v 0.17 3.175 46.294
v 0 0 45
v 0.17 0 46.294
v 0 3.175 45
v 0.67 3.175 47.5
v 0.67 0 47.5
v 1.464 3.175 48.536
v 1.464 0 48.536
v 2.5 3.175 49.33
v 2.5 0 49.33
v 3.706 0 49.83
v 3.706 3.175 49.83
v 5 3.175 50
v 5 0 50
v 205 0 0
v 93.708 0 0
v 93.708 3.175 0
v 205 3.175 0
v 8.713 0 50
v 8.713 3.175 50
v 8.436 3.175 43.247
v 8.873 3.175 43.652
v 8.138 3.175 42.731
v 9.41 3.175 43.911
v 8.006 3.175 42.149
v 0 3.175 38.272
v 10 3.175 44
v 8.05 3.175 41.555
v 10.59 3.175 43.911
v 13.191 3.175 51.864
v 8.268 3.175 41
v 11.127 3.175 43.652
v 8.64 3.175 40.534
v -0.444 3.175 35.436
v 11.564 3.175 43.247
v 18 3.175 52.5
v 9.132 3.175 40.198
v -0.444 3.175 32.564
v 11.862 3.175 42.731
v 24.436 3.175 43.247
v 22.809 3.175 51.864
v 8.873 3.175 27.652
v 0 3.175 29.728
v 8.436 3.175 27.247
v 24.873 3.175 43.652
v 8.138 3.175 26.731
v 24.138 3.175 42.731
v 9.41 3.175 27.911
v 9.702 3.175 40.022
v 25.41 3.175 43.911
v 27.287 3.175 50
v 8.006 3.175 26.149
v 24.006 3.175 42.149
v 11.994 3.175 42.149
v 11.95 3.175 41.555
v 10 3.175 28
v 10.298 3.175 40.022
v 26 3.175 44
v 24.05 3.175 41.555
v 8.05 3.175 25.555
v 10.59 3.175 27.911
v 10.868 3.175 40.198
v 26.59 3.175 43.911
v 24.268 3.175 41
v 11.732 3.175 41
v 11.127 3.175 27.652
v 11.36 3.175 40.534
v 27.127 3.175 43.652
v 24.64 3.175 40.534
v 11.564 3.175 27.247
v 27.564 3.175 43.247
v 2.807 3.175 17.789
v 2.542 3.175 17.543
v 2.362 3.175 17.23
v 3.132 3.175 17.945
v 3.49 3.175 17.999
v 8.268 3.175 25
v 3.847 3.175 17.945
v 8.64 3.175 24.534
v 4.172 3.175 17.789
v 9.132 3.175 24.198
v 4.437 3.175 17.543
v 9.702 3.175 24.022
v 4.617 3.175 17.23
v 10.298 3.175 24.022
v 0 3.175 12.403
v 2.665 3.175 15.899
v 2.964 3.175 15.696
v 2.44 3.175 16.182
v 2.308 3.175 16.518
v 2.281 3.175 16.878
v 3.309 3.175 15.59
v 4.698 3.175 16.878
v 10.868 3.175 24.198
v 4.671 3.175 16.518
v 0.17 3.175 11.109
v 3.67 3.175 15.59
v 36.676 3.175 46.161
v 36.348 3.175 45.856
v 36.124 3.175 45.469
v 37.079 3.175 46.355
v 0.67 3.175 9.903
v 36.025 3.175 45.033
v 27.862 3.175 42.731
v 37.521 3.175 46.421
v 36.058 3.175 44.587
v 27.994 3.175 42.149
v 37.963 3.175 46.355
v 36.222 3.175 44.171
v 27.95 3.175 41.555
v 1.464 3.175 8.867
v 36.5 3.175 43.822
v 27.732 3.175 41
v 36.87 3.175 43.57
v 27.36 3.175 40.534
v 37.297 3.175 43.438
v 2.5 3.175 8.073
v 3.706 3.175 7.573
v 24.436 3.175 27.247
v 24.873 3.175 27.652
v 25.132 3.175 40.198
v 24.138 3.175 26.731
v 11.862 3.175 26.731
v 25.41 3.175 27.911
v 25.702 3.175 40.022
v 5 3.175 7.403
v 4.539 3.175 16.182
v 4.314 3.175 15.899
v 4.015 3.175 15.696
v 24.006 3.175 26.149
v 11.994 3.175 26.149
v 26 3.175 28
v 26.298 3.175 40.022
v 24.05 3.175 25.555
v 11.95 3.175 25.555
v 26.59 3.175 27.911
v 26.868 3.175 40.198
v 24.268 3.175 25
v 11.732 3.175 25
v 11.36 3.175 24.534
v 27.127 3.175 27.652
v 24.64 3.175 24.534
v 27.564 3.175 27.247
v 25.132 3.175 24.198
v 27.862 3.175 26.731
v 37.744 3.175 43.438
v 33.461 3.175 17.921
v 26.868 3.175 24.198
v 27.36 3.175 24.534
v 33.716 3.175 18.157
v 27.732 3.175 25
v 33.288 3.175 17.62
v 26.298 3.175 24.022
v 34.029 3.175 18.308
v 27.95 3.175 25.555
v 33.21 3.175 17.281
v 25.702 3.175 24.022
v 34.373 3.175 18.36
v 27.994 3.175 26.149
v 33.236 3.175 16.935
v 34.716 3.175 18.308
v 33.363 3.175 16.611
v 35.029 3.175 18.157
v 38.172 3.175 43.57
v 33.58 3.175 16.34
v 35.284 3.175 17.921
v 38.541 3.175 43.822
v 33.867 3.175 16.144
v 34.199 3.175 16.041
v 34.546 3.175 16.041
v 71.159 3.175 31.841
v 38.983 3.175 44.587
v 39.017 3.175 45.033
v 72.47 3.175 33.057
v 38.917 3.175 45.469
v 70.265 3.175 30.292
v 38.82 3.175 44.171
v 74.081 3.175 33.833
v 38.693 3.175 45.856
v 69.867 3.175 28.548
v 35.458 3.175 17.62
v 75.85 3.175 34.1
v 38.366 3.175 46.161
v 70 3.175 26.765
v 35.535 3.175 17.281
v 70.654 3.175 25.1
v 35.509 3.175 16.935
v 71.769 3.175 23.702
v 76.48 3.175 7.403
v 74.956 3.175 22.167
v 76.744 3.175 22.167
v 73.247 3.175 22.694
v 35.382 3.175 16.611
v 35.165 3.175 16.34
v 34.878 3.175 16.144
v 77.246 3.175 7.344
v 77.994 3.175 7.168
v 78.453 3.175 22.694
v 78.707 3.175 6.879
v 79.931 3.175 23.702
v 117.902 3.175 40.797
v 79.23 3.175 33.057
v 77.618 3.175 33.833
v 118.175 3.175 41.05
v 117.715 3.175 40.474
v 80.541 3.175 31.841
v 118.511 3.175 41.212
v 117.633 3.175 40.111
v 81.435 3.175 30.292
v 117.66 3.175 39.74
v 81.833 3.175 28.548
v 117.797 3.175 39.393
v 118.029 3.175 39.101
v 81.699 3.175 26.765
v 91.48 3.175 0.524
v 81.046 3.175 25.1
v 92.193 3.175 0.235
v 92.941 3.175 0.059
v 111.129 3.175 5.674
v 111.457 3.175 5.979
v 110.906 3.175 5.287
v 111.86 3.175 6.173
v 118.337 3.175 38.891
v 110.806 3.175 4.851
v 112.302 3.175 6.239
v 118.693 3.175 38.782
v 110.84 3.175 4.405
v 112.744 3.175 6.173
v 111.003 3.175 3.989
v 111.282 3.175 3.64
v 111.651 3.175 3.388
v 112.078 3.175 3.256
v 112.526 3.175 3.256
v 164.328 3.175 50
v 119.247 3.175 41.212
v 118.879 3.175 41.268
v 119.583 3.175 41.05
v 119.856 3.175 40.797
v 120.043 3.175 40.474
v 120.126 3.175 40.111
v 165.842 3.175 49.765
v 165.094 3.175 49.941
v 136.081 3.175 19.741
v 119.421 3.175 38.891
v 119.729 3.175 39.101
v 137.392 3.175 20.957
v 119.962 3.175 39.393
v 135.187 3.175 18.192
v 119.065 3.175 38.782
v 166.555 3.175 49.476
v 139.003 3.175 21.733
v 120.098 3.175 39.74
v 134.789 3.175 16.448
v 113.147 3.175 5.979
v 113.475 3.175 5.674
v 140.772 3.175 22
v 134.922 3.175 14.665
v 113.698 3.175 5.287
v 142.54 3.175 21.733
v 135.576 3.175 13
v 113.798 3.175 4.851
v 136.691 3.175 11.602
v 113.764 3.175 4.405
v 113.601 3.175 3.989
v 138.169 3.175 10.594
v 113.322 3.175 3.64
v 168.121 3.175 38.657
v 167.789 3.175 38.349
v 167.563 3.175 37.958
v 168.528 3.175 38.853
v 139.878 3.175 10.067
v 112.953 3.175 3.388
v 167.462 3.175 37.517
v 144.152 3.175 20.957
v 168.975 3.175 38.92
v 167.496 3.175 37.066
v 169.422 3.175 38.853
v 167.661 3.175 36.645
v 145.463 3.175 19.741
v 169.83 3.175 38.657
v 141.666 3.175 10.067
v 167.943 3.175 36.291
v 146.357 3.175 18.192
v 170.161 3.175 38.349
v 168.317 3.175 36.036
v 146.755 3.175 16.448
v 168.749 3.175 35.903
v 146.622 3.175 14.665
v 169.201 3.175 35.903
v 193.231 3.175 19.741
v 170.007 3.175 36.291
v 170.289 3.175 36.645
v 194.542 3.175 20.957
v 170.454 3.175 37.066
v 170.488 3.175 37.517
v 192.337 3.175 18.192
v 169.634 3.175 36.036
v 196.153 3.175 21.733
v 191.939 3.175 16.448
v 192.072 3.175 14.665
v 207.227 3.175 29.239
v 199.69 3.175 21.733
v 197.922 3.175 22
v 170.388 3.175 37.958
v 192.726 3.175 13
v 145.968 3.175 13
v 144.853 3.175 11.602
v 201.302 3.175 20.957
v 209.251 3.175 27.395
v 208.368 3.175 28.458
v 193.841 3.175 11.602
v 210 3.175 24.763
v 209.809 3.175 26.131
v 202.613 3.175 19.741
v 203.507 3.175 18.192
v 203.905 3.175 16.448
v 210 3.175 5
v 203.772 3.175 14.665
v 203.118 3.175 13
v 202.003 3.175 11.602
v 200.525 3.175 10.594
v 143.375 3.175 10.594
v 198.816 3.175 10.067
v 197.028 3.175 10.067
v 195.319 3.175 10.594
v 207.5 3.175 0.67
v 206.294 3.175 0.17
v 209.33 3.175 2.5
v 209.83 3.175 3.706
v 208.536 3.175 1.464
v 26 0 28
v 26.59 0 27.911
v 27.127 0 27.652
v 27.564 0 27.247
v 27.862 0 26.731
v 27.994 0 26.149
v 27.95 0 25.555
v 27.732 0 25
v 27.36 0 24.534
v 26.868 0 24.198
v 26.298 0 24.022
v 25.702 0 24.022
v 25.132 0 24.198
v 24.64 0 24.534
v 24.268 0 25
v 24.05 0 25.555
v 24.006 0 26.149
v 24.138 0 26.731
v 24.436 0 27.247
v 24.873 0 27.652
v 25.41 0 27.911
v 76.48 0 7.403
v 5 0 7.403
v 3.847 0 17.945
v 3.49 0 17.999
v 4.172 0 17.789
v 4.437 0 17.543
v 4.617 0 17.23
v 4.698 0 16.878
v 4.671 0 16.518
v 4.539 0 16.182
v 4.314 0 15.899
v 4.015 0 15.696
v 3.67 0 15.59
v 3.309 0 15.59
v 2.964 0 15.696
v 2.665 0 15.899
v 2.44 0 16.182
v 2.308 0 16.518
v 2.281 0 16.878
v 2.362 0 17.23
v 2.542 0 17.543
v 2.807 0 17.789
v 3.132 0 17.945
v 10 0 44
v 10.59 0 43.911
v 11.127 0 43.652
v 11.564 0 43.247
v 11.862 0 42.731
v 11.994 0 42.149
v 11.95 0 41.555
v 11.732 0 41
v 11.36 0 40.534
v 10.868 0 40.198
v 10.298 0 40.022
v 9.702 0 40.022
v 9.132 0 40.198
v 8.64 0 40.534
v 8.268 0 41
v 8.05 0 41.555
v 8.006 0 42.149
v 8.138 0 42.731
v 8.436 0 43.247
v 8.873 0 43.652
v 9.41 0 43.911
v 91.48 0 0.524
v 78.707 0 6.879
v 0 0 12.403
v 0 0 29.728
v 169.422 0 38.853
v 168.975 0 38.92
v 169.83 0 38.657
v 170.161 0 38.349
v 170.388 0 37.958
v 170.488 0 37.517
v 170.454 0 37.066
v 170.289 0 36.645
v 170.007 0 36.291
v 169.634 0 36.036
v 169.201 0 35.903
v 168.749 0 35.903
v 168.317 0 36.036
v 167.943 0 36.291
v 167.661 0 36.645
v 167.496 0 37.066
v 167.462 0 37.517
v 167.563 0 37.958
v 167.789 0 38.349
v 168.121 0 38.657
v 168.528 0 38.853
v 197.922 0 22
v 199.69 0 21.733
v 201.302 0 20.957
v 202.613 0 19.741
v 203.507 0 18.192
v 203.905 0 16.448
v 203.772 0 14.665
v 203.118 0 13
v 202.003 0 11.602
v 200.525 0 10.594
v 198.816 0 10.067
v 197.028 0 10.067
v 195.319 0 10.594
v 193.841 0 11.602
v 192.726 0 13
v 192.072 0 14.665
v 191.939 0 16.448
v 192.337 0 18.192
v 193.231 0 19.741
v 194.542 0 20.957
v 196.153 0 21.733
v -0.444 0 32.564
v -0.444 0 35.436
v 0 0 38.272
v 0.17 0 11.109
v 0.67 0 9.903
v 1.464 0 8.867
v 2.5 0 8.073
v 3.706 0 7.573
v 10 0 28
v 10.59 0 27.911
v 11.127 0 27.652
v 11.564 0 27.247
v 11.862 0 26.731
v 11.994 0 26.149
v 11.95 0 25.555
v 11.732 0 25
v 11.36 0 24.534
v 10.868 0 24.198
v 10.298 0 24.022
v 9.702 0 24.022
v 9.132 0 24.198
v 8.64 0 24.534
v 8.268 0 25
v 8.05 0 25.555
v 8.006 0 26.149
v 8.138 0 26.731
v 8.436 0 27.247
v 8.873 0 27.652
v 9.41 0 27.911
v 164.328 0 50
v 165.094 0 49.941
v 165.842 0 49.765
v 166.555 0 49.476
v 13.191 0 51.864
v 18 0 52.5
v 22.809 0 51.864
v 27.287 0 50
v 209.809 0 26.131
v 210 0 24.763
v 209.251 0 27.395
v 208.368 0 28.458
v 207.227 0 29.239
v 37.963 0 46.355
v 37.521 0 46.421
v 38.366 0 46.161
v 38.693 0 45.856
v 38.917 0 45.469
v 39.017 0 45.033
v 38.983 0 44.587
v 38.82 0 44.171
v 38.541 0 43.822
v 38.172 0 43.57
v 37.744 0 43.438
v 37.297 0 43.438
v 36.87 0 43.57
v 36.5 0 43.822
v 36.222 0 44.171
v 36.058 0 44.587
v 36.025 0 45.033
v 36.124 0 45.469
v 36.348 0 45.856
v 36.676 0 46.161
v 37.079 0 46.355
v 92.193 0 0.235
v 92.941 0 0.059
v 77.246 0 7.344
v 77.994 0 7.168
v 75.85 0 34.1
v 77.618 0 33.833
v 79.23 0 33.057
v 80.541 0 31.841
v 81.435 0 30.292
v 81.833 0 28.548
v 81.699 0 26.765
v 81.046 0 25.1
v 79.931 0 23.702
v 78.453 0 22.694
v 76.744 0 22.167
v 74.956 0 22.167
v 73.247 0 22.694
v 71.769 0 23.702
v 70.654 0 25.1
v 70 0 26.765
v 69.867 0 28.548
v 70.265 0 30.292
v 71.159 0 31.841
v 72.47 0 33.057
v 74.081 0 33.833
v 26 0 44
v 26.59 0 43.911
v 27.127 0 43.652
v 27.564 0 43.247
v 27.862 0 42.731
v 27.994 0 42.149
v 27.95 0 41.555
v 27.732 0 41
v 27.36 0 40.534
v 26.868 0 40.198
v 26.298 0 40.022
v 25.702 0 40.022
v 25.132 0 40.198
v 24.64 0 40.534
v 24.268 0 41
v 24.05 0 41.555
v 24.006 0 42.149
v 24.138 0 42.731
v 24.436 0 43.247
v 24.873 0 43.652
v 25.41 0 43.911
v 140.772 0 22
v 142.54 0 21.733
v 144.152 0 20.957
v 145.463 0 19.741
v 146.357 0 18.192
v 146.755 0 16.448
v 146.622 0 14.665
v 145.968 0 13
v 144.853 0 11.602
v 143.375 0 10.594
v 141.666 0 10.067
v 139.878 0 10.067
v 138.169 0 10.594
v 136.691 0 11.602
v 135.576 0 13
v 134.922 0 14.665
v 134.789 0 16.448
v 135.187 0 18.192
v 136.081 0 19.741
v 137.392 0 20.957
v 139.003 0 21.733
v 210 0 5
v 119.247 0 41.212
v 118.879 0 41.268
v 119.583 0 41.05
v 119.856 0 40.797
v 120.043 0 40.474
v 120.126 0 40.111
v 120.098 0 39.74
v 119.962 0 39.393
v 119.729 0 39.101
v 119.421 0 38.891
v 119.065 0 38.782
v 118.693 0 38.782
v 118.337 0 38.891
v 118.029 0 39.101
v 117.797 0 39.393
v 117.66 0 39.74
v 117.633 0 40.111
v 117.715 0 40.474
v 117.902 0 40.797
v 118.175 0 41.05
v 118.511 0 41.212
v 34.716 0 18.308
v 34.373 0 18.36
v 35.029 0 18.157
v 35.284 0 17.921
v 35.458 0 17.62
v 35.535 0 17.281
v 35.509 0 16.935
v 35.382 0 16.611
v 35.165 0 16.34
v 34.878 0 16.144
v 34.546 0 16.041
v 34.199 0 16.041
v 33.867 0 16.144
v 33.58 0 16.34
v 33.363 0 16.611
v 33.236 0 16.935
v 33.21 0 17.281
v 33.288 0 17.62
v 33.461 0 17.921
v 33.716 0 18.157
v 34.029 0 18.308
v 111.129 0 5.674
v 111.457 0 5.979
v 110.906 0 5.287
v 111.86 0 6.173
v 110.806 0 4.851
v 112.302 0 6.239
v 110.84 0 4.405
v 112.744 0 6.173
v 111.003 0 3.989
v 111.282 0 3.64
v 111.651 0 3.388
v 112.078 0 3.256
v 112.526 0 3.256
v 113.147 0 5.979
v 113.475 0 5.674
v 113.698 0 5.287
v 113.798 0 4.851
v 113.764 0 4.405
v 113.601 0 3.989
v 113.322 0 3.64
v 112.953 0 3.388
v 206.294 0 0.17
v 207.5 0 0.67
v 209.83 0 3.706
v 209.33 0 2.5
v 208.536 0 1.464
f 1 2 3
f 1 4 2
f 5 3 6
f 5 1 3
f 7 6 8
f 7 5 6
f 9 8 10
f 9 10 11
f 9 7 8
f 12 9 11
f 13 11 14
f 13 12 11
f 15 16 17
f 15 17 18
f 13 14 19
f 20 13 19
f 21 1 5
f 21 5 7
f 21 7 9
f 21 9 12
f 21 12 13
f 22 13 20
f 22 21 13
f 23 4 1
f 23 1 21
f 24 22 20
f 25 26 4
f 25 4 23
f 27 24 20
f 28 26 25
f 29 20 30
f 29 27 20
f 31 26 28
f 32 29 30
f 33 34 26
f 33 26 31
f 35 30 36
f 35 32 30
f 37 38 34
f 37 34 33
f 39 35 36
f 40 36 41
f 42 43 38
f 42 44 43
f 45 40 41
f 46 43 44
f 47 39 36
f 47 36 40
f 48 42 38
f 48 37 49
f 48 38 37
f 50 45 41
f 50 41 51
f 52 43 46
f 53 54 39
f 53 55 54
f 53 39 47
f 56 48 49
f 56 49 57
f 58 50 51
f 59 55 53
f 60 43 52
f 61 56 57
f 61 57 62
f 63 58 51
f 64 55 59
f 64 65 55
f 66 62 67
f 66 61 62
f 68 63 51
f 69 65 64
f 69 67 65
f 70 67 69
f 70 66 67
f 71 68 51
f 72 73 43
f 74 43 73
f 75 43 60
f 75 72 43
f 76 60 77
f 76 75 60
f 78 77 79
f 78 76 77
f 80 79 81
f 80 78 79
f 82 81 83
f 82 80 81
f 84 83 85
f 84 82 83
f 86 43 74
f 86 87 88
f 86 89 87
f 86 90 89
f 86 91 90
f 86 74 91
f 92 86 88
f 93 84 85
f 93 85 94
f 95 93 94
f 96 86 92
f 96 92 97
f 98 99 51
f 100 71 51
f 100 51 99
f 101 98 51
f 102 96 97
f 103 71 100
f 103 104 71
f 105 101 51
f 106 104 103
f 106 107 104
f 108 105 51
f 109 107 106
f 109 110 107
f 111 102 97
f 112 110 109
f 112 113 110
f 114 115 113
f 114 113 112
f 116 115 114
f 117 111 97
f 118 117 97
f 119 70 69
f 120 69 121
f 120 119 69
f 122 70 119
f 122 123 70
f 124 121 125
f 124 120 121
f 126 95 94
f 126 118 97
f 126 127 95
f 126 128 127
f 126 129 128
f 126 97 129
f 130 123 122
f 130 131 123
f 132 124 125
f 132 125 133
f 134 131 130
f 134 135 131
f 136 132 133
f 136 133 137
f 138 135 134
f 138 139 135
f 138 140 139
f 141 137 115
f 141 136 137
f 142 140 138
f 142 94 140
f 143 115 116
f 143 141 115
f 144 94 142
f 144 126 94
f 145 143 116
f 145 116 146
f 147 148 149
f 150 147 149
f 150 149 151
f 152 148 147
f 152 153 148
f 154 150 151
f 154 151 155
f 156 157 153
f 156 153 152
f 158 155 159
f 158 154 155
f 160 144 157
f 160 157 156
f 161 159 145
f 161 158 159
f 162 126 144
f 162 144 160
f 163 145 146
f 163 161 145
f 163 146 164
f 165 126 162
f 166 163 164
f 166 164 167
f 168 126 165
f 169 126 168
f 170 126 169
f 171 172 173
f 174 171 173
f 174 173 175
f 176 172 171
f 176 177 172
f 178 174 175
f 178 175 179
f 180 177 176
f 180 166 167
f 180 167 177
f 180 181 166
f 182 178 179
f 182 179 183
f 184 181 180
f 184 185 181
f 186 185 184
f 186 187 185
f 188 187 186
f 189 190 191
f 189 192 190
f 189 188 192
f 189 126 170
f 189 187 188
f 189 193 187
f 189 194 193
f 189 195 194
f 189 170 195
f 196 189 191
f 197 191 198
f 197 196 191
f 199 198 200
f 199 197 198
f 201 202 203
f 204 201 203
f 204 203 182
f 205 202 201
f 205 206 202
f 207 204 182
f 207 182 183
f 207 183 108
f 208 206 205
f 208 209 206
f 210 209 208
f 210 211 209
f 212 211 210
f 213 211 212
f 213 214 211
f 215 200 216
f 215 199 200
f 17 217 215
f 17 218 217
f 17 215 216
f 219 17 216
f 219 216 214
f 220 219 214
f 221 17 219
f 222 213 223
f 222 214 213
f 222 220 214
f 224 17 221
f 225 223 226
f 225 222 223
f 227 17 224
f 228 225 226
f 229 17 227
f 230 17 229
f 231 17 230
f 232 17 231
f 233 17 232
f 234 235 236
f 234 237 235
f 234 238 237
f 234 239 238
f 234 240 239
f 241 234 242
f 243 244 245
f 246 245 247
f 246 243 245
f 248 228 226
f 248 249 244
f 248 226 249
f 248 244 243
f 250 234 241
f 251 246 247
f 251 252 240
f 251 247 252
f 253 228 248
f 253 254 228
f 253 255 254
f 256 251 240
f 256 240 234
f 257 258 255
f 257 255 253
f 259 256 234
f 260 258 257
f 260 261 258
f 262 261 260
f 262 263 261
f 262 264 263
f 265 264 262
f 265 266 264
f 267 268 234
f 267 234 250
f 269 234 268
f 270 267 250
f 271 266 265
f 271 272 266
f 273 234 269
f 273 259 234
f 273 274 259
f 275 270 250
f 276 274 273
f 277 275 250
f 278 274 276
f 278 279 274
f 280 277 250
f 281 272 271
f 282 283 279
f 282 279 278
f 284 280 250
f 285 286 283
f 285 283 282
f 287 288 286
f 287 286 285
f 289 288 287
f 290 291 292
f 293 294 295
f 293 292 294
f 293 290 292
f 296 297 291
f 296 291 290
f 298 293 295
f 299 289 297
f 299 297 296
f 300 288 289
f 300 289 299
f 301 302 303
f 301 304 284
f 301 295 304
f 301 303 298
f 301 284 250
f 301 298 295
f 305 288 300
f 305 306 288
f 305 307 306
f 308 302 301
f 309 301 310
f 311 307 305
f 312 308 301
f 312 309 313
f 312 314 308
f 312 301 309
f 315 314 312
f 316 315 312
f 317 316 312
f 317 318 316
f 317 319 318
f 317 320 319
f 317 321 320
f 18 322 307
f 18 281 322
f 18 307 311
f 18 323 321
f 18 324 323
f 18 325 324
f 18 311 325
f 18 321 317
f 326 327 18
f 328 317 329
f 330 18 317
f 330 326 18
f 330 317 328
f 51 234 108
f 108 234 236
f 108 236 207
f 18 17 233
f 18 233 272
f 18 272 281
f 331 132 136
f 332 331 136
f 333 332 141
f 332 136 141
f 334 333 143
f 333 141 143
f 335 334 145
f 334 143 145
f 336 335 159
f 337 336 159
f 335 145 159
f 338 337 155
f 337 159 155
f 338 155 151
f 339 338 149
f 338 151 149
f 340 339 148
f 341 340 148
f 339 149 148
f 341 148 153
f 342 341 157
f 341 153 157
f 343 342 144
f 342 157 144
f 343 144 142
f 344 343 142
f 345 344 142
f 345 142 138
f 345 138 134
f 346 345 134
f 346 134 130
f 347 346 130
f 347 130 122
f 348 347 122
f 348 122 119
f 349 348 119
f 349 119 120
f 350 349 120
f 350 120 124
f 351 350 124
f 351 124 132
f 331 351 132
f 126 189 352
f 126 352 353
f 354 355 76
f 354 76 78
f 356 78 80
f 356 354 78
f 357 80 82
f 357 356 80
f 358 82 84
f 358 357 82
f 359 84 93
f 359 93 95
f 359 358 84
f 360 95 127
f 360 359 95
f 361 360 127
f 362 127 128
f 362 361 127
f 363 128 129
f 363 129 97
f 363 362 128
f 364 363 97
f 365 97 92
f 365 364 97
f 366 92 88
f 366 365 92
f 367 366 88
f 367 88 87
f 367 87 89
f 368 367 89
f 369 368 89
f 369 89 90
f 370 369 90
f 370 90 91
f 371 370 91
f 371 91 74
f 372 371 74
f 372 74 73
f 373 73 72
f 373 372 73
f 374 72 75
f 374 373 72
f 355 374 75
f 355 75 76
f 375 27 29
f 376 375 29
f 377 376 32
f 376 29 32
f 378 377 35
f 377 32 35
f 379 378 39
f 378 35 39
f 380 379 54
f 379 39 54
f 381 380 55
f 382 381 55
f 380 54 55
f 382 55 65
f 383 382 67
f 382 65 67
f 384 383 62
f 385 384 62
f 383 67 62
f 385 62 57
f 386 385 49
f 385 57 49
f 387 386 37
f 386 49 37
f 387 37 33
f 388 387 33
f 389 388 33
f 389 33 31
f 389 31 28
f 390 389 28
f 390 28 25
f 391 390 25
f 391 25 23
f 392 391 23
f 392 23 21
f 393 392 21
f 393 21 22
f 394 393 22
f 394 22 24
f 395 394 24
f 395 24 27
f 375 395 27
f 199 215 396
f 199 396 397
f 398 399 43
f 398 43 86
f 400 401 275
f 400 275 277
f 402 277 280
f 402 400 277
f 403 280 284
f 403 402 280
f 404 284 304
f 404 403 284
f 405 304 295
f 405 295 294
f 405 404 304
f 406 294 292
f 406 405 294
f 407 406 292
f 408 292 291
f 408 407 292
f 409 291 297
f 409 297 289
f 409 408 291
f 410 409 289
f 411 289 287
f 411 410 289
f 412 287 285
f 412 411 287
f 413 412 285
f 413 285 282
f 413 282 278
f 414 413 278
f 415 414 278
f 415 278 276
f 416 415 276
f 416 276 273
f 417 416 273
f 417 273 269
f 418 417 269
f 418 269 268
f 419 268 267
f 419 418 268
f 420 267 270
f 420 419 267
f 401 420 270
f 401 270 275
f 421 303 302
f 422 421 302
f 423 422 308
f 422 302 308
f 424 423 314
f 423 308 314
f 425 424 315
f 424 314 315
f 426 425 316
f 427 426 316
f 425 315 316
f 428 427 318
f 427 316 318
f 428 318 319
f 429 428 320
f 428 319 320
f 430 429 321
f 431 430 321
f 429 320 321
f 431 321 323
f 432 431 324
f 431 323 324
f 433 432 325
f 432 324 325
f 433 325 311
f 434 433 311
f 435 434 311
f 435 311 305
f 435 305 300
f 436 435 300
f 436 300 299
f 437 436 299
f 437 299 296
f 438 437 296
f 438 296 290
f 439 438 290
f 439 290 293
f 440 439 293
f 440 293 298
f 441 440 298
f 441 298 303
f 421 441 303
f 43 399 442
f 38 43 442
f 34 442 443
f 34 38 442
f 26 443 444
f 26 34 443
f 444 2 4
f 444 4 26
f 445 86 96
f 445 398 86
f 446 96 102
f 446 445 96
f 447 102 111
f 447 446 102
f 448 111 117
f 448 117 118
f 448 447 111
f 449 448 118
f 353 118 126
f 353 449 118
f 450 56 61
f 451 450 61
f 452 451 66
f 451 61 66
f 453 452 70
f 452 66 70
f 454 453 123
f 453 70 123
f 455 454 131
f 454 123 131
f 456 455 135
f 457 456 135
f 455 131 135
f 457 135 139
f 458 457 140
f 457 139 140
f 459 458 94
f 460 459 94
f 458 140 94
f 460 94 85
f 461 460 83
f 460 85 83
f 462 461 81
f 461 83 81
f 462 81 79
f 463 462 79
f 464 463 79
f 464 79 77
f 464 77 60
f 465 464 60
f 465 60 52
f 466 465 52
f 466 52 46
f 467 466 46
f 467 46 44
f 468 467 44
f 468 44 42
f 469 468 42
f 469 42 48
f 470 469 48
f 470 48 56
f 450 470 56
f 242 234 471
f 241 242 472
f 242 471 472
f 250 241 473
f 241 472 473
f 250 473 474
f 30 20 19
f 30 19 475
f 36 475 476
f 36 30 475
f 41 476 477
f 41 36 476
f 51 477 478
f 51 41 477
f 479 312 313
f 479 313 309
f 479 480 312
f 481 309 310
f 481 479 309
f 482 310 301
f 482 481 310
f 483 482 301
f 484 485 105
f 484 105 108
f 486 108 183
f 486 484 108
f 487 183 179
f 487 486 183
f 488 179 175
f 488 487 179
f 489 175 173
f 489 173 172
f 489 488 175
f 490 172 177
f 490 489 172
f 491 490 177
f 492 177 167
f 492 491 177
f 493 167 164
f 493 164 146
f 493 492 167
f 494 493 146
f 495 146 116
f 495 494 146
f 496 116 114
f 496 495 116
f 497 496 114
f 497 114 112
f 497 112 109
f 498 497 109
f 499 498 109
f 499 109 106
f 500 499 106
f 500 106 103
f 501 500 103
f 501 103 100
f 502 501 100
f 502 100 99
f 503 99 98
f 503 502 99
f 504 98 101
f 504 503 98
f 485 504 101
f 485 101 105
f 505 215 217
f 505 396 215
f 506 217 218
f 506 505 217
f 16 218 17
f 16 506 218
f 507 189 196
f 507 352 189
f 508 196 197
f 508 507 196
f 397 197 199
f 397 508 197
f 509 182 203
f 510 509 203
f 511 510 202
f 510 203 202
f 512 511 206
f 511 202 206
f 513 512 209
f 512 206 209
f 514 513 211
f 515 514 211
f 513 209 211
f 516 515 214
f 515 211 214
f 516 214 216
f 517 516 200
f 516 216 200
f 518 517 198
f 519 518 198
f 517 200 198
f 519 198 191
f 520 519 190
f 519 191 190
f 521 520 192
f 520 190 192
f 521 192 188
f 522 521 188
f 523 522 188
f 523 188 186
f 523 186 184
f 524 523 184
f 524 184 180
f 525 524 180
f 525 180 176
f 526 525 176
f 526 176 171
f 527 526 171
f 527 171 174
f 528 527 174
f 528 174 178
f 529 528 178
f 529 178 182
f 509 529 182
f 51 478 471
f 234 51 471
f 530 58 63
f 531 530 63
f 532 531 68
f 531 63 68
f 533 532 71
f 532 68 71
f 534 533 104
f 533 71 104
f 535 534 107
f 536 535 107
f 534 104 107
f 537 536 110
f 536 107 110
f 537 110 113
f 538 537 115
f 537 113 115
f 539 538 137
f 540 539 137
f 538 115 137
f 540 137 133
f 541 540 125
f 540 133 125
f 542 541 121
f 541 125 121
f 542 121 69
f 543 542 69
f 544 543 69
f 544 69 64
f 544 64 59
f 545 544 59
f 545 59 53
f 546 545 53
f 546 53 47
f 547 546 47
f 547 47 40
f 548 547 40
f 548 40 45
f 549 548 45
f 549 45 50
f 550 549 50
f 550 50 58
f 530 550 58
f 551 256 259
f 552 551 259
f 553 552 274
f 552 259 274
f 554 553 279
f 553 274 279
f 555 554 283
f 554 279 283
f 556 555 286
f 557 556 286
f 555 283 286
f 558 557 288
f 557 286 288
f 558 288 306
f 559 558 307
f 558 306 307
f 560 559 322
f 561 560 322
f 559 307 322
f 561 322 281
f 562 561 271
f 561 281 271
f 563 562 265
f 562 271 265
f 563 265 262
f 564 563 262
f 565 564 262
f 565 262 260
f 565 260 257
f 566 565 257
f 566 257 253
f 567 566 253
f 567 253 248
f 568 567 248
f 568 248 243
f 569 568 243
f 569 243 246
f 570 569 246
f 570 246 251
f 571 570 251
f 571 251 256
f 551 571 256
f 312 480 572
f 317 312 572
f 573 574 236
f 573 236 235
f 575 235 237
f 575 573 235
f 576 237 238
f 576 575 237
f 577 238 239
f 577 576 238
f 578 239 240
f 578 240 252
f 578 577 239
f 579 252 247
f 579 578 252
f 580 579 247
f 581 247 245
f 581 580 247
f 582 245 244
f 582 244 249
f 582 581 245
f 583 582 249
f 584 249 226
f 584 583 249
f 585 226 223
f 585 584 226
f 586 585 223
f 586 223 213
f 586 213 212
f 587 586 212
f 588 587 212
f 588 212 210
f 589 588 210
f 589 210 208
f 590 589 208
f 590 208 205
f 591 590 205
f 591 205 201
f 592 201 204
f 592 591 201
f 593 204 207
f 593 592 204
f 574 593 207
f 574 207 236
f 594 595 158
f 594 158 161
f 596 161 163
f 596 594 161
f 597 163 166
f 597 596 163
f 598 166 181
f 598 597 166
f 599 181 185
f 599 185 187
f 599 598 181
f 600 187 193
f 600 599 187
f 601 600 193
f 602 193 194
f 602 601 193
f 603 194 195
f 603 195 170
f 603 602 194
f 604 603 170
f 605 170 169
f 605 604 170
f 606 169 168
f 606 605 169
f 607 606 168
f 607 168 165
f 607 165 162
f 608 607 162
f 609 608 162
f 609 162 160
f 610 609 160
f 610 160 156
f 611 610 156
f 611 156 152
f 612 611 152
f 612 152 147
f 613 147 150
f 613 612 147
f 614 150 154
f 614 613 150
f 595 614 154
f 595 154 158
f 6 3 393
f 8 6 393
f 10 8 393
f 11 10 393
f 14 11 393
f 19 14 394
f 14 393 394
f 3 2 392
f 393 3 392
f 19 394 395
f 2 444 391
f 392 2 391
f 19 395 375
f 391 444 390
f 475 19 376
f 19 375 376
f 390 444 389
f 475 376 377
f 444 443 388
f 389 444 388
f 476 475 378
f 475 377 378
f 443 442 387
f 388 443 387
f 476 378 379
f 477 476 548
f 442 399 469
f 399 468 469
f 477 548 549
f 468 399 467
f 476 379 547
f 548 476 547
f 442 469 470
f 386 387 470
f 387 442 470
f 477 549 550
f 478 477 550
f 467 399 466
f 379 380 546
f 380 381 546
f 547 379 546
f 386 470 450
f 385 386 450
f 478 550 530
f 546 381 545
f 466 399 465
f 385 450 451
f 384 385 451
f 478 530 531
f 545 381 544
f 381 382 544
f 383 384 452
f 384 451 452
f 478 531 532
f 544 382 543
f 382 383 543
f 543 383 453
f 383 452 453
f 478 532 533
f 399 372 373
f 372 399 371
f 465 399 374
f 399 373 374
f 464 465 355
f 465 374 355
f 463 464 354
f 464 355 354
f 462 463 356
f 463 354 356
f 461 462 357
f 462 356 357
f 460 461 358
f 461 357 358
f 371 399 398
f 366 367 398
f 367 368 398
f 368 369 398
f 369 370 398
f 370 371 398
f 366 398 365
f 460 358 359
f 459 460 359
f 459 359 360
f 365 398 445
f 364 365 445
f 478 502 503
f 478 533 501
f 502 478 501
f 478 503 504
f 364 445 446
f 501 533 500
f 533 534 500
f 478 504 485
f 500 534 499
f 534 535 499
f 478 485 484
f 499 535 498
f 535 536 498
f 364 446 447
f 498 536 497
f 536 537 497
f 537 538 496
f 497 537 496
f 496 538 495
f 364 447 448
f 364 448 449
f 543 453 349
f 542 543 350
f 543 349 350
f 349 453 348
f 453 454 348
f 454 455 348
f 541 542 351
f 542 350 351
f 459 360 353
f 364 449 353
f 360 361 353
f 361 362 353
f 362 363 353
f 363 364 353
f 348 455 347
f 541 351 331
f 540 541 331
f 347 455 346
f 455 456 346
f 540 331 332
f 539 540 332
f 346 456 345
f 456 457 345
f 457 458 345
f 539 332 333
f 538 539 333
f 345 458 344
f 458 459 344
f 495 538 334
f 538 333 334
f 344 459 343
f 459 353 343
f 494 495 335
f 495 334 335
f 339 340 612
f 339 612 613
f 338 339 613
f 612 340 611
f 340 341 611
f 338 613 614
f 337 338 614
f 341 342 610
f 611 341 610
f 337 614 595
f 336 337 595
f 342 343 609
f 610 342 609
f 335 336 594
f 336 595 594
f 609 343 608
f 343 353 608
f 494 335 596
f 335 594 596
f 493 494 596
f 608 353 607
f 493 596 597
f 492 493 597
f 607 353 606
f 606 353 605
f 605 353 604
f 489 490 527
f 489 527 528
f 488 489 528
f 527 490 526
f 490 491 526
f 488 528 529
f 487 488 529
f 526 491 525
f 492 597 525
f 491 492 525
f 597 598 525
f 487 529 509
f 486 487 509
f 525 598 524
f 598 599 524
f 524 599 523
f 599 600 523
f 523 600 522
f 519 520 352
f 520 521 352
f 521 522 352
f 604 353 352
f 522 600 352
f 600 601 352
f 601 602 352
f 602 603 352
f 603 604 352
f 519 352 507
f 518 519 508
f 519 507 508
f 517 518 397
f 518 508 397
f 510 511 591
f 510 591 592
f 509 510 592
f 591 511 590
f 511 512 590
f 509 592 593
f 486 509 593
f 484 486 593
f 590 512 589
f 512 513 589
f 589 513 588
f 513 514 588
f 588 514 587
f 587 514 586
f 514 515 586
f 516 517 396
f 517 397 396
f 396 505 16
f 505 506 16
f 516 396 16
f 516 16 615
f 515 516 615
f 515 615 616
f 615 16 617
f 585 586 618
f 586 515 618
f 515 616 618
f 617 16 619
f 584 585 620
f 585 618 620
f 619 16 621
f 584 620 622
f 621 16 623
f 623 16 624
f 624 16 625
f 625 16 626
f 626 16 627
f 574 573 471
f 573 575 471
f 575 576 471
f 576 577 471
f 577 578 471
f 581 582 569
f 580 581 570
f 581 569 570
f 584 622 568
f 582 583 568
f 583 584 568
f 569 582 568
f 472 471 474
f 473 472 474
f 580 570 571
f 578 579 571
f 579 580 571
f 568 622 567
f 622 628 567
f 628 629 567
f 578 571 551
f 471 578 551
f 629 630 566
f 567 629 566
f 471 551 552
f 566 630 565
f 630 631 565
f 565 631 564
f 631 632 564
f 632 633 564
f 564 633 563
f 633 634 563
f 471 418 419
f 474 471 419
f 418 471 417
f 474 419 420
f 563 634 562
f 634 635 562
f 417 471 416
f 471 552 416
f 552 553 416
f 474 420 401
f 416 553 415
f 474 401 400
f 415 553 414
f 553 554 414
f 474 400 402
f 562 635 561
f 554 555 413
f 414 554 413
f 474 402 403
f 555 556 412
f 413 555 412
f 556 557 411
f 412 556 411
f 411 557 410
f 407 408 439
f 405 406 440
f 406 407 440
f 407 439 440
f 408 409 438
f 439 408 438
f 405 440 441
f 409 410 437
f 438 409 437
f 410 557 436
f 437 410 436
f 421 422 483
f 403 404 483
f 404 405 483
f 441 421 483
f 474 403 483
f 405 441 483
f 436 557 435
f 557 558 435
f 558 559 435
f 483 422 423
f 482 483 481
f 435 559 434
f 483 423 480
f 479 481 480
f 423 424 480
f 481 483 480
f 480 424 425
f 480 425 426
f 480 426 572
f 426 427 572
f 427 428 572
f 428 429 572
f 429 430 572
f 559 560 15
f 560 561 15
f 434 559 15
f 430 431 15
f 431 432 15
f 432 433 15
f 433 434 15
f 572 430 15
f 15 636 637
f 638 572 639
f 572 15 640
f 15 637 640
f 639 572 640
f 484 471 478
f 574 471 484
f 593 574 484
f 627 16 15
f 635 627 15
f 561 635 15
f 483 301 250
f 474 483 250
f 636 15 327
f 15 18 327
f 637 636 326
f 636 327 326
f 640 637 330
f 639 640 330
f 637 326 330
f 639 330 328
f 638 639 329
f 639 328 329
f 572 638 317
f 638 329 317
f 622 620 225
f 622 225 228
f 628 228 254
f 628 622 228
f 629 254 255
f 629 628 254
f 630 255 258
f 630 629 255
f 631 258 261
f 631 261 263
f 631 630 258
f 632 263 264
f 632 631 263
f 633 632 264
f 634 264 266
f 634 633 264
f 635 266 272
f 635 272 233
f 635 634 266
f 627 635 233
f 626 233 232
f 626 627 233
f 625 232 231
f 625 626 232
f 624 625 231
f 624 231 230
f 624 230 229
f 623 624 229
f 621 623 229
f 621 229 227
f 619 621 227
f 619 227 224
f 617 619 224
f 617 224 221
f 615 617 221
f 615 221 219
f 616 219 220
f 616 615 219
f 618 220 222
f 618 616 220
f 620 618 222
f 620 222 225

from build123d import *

# Parameters (mm, degrees)
SKETCH1_W           = 210
SKETCH1_H           = 50
SKETCH1_R           = 1.211665018
SKETCH1_R_2         = 1.165617118
SKETCH1_R_3         = 1.5
SKETCH1_R_4         = 1.25
SKETCH1_R_5         = 1.517273905
BOSS_EXTRUDE1_DEPTH = 3.175
SKETCH2_R           = 2
CUT_EXTRUDE1_DEPTH  = 10
SKETCH3_R           = 6
SKETCH3_R_2         = 0.586995366
CUT_EXTRUDE2_DEPTH  = 57.15
CUT_EXTRUDE7_DEPTH  = 10
FILLET3_R           = 5
SKETCH11_R          = 18.5
SKETCH11_R_2        = 2
BOSS_EXTRUDE4_DEPTH = 3.175


with BuildPart() as part:
    # Sketch1 → Boss-Extrude1 (new body)
    with BuildSketch(Plane(origin=(0, 0, 0), x_dir=(1, 0, 0), z_dir=(0, 1, 0))):
        with Locations((105, -25)):
            Rectangle(SKETCH1_W, SKETCH1_H)
        with Locations(Location((3.489526233, -16.787661112, 0), (0, 0, 270))):
            Circle(SKETCH1_R, mode=Mode.SUBTRACT)
        with Locations(Location((34.37258772, -17.194005245, 0), (0, 0, 270))):
            Circle(SKETCH1_R_2, mode=Mode.SUBTRACT)
        with Locations(Location((37.520749958, -44.921198121, 0), (0, 0, 270))):
            Circle(SKETCH1_R_3, mode=Mode.SUBTRACT)
        with Locations(Location((118.879039361, -40.017685043, 0), (0, 0, 270))):
            Circle(SKETCH1_R_4, mode=Mode.SUBTRACT)
        with Locations(Location((112.302052499, -4.739260115, 0), (0, 0, 270))):
            Circle(SKETCH1_R_3, mode=Mode.SUBTRACT)
        with Locations(Location((168.975233936, -37.403209633, 0), (0, 0, 270))):
            Circle(SKETCH1_R_5, mode=Mode.SUBTRACT)
    extrude(amount=BOSS_EXTRUDE1_DEPTH)

    # Sketch2 → Cut-Extrude1 (cut)
    with BuildSketch(Plane(origin=(0, 3.175, 0), x_dir=(1, 0, 0), z_dir=(0, 1, 0))):
        with Locations(Location((10, -26, 0), (0, 0, 270))):
            Circle(SKETCH2_R)
        with Locations(Location((10, -42, 0), (0, 0, 270))):
            Circle(SKETCH2_R)
        with Locations(Location((26, -26, 0), (0, 0, 270))):
            Circle(SKETCH2_R)
        with Locations(Location((26, -42, 0), (0, 0, 270))):
            Circle(SKETCH2_R)
    extrude(amount=-CUT_EXTRUDE1_DEPTH, mode=Mode.SUBTRACT)

    # Sketch3 → Cut-Extrude2 (cut)
    with BuildSketch(Plane(origin=(0, 3.175, 0), x_dir=(1, 0, 0), z_dir=(0, 1, 0))):
        with Locations(Location((75.84991357, -28.1, 0), (0, 0, 270))):
            Circle(SKETCH3_R)
        with Locations(Location((140.771956051, -16, 0), (0, 0, 270))):
            Circle(SKETCH3_R)
        with Locations(Location((18, -34, 0), (0, 0, 270))):
            Circle(SKETCH3_R_2)
        with Locations(Location((197.921956051, -16, 0), (0, 0, 270))):
            Circle(SKETCH3_R)
    extrude(amount=-CUT_EXTRUDE2_DEPTH, mode=Mode.SUBTRACT)

    # Sketch10 → Cut-Extrude7 (cut)
    with BuildSketch(Plane(origin=(0, 3.175, 0), x_dir=(1, 0, 0), z_dir=(0, 1, 0))):
        Polygon((210, -27.859435908), (165.502877994, -50), (210, -50), align=None)
        Polygon((92.532613397, 0), (77.65477062, -7.402812063), (0, -7.402812063), (0, 0), align=None)
    extrude(amount=-CUT_EXTRUDE7_DEPTH, mode=Mode.SUBTRACT)

    # Fillet3
    fillet3_edges = [part.edges().sort_by_distance(p)[0] for p in [
        (210, 1.5875, 0),
        (0, 1.5875, 50),
        (92.532613397, 1.5875, 0),
        (210, 1.5875, 27.859435908),
        (165.502877994, 1.5875, 50),
        (77.65477062, 1.5875, 7.402812063),
        (0, 1.5875, 7.402812063),
    ]]
    fillet(fillet3_edges, radius=FILLET3_R)

    # Sketch11 → Boss-Extrude4 (add)
    with BuildSketch(Plane(origin=(0, 3.175, 0), x_dir=(1, 0, 0), z_dir=(0, 1, 0))):
        with Locations((18, -34)):
            Circle(SKETCH11_R)
        with Locations(Location((10, -26, 0), (0, 0, 270))):
            Circle(SKETCH11_R_2, mode=Mode.SUBTRACT)
        with Locations(Location((10, -42, 0), (0, 0, 270))):
            Circle(SKETCH11_R_2, mode=Mode.SUBTRACT)
        with Locations(Location((26, -26, 0), (0, 0, 270))):
            Circle(SKETCH11_R_2, mode=Mode.SUBTRACT)
        with Locations(Location((26, -42, 0), (0, 0, 270))):
            Circle(SKETCH11_R_2, mode=Mode.SUBTRACT)
    extrude(amount=-BOSS_EXTRUDE4_DEPTH)


solid = part.part
